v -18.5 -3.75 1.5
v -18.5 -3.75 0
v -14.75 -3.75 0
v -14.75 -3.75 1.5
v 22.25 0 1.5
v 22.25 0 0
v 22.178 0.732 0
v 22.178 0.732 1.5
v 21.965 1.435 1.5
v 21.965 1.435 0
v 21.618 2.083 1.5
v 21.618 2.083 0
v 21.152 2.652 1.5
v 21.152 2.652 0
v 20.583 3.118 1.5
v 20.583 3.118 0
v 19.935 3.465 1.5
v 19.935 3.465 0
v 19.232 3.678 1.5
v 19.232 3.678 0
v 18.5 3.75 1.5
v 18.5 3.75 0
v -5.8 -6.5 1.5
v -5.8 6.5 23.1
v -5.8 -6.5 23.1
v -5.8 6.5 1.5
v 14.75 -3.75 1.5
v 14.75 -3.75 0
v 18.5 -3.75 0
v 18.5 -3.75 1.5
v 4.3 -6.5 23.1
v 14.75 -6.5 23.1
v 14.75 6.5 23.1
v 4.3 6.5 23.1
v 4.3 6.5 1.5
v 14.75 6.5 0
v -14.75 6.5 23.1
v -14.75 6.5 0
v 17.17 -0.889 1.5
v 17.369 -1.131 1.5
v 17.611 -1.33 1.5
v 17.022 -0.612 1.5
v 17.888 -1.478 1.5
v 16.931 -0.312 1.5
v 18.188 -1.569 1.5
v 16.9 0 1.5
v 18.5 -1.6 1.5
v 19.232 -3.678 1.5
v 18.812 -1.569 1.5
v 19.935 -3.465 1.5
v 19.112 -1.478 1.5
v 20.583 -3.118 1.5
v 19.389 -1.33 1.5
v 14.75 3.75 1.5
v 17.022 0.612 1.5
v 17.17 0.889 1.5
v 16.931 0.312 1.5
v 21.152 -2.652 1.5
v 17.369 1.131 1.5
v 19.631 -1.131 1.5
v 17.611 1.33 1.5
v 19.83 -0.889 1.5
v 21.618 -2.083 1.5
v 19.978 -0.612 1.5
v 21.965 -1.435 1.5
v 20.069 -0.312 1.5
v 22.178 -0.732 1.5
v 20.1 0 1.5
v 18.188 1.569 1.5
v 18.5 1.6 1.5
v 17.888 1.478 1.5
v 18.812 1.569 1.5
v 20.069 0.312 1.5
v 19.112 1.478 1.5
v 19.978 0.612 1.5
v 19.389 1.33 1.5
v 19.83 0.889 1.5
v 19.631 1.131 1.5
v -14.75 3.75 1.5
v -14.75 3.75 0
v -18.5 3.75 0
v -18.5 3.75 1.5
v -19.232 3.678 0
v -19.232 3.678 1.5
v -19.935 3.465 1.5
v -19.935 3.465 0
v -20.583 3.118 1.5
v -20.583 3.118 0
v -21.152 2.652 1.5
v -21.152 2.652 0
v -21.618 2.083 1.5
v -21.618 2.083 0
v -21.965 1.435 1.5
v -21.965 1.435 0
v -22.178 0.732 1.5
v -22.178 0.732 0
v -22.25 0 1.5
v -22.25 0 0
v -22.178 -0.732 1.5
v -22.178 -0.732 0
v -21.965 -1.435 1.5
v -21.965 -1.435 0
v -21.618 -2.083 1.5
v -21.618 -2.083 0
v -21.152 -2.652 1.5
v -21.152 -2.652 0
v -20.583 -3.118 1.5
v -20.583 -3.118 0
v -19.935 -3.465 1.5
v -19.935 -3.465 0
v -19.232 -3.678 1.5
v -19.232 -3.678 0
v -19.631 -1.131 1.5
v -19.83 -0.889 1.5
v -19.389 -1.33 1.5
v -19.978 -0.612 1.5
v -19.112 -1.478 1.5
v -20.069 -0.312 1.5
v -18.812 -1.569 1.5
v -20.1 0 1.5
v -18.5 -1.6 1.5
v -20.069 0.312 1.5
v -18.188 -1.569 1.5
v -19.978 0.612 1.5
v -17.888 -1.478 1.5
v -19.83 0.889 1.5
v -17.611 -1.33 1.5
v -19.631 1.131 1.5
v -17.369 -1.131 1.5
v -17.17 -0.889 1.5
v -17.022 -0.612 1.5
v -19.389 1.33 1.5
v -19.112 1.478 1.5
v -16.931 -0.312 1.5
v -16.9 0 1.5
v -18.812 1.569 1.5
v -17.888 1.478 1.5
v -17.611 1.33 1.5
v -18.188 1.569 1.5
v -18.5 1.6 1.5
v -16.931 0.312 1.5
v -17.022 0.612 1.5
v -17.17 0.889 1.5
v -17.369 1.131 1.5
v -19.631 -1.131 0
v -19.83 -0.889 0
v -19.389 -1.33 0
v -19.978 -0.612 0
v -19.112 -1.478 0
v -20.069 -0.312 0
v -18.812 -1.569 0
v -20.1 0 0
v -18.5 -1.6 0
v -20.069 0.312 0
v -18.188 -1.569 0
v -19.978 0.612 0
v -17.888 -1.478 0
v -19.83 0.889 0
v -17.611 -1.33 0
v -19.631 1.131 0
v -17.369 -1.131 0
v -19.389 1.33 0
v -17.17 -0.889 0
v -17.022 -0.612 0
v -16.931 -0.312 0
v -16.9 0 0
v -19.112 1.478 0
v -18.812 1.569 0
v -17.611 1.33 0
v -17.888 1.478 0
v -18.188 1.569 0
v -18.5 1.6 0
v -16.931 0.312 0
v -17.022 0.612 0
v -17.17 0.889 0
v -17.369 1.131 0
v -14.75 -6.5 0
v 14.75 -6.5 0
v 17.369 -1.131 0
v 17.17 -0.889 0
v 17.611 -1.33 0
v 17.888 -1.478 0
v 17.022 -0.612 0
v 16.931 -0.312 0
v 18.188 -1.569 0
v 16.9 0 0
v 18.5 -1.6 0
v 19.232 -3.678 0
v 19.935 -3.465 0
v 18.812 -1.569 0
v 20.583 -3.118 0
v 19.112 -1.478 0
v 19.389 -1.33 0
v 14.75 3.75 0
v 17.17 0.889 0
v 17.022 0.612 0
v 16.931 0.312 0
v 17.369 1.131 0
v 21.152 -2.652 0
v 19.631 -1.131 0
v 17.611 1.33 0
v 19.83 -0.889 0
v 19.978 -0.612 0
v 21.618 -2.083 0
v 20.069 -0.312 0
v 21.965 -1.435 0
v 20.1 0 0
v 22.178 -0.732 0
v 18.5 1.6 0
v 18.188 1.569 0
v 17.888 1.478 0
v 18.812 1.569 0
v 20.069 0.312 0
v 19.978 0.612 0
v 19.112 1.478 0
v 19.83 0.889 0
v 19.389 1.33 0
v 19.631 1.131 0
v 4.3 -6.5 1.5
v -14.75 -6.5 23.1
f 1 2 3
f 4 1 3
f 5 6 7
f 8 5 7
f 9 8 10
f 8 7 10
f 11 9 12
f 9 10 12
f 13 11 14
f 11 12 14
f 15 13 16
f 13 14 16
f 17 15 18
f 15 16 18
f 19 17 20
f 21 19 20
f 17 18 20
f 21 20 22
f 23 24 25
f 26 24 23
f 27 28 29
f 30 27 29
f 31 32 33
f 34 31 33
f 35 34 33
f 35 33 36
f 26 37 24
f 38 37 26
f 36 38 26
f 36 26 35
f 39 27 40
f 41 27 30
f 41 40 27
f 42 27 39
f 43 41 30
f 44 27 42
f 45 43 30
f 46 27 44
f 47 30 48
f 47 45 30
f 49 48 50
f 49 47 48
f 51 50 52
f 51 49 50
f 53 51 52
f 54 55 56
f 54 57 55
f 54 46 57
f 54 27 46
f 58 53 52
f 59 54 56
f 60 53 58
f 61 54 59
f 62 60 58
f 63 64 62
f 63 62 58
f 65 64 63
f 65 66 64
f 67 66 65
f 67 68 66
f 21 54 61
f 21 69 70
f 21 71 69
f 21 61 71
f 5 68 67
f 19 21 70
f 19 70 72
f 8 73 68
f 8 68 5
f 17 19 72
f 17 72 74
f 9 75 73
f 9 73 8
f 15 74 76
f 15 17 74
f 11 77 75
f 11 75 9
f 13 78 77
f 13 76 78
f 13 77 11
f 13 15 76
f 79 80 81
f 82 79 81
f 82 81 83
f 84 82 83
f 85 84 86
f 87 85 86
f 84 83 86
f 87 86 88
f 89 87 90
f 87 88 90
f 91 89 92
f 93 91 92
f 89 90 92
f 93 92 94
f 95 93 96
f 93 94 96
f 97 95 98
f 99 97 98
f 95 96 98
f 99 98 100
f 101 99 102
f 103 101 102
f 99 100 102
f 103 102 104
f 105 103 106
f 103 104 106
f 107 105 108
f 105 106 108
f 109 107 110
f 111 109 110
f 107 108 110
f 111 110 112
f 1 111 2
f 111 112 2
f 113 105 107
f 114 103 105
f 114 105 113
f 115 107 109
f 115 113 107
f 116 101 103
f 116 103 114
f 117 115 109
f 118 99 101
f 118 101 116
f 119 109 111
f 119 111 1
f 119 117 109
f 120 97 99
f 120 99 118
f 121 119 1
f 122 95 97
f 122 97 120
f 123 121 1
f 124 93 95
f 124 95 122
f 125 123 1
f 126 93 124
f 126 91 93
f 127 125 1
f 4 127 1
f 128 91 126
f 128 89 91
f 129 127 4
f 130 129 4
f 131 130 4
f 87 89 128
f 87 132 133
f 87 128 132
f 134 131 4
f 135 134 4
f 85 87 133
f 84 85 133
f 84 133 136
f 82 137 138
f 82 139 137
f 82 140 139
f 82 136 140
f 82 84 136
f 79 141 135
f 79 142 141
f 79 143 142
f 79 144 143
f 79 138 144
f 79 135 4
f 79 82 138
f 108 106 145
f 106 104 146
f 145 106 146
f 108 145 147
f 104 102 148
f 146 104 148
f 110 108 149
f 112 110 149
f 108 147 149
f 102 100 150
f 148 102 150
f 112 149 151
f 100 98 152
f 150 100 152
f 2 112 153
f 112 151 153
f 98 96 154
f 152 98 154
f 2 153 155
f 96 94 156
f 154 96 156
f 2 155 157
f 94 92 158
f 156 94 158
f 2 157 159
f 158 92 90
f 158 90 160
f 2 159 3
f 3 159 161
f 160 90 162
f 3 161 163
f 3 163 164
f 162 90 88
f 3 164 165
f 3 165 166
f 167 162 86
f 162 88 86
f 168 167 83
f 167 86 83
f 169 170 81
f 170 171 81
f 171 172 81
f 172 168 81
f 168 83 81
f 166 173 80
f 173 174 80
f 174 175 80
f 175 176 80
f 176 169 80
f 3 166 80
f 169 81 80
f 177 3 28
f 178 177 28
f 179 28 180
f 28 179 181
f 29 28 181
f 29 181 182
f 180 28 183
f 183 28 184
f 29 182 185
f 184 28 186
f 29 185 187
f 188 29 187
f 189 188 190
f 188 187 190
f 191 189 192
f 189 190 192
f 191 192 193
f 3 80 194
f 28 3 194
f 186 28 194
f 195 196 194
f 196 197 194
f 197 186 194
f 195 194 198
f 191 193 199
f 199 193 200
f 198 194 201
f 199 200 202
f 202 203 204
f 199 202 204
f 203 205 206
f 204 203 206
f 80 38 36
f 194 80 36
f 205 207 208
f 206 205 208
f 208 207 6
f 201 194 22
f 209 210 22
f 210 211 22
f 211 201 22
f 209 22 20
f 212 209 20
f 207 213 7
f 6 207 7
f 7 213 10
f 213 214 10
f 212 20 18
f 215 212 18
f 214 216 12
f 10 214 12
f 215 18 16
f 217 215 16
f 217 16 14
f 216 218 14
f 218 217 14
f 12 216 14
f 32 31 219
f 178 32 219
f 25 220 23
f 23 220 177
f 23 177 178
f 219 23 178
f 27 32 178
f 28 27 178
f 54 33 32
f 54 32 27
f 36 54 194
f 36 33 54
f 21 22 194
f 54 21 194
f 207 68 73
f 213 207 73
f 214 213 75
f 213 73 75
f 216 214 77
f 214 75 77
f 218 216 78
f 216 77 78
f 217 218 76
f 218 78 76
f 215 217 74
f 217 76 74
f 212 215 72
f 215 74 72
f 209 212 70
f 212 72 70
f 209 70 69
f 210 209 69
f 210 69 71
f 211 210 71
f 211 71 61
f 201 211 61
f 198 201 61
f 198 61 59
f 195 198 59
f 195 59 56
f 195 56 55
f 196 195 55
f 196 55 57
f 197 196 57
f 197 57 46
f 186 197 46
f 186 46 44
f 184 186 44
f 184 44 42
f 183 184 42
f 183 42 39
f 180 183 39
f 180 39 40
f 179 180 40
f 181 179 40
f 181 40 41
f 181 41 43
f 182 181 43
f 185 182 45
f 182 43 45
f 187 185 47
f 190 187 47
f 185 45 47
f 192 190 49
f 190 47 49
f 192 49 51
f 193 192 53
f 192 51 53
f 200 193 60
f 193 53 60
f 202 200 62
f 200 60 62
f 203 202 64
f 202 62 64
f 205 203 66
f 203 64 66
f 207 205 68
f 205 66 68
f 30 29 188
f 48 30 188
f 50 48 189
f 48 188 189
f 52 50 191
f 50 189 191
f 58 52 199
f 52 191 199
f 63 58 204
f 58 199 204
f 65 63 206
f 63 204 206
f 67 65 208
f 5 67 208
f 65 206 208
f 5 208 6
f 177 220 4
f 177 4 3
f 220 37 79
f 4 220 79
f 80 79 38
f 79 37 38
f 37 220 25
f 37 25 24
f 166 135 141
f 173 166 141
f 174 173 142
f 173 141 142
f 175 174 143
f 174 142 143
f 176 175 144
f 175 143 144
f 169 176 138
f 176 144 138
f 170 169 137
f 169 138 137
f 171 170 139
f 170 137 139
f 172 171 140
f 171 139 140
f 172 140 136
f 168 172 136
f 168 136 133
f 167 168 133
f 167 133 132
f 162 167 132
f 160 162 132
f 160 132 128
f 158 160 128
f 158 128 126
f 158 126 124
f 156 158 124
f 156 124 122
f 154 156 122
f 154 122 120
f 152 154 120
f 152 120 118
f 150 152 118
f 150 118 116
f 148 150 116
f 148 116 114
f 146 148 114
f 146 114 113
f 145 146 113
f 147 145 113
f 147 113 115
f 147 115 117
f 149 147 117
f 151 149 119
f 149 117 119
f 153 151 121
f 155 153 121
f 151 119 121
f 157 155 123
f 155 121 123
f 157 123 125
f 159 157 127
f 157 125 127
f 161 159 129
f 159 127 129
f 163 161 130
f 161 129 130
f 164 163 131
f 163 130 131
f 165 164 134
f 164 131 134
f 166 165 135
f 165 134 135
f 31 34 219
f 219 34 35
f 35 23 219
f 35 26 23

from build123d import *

# Parameters (mm, degrees)
BACK_PLATE_DEPTH               = 1.5
DETECTOR_START                 = 14.75
SKETCH2_W                      = 21.6
SKETCH2_H                      = 13
DETECTOR_SIDE_DEPTH            = 10.45
EMITTER_START                  = -14.75
SKETCH2_2_W                    = 21.6
SKETCH2_2_H                    = 13
EMITTER_SIDE_DEPTH             = 8.95
F_3_2_3_2_DIAMETER_HOLE1_D     = 3.2
F_3_2_3_2_DIAMETER_HOLE1_DEPTH = 4
F_3_2_3_2_DIAMETER_HOLE1_TIP   = 0.96137699


with BuildPart() as part:
    # Sketch1 → Back Plate (new body)
    with BuildSketch(Plane.XY):
        with BuildLine():
            ThreePointArc((-18.5, -3.75), (-15.848349571, -2.651650429), (-14.75, 0))
            ThreePointArc((-14.75, 0), (-15.848349571, 2.651650429), (-18.5, 3.75))
            Line((-18.5, 3.75), (-18.5, -3.75))
        make_face()
        with BuildLine():
            ThreePointArc((-18.5, 3.75), (-22.25, 0), (-18.5, -3.75))
            Line((-18.5, -3.75), (-18.5, 3.75))
        make_face()
        with BuildLine():
            ThreePointArc((-18.5, 3.75), (-15.848349571, 2.651650429), (-14.75, 0))
            Line((-14.75, 0), (-14.75, 3.75))
            Line((-14.75, 3.75), (-18.5, 3.75))
        make_face()
        with BuildLine():
            Line((-18.5, -3.75), (-14.75, -3.75))
            Line((-14.75, -3.75), (-14.75, 0))
            ThreePointArc((-14.75, 0), (-15.848349571, -2.651650429), (-18.5, -3.75))
        make_face()
        Polygon((-14.75, -3.75), (-14.75, -6.5), (14.75, -6.5), (14.75, -3.75), (14.75, 4e-09), (14.75, 3.75), (14.75, 6.5), (-14.75, 6.5), (-14.75, 3.75), (-14.75, 0), align=None)
        with BuildLine():
            Line((14.75, 4e-09), (14.75, -3.75))
            Line((14.75, -3.75), (18.5, -3.75))
            ThreePointArc((18.5, -3.75), (15.848349569, -2.651650428), (14.75, 4e-09))
        make_face()
        with BuildLine():
            Line((14.75, 3.75), (14.75, 4e-09))
            ThreePointArc((14.75, 4e-09), (15.848349572, 2.651650431), (18.5, 3.75))
            Line((18.5, 3.75), (14.75, 3.75))
        make_face()
        with BuildLine():
            ThreePointArc((18.5, 3.75), (15.848349572, 2.651650431), (14.75, 4e-09))
            ThreePointArc((14.75, 4e-09), (15.848349569, -2.651650428), (18.5, -3.75))
            Line((18.5, -3.75), (18.5, 3.75))
        make_face()
        with BuildLine():
            Line((18.5, 3.75), (18.5, -3.75))
            ThreePointArc((18.5, -3.75), (21.151650429, -2.651650429), (22.25, 0))
            ThreePointArc((22.25, 0), (21.151650429, 2.651650429), (18.5, 3.75))
        make_face()
    extrude(amount=BACK_PLATE_DEPTH)

    # Sketch2 → Detector Side (add)
    with BuildSketch(Plane(origin=(0, 0, 0), x_dir=(0, 0, -1), z_dir=(1, 0, 0)).offset(DETECTOR_START)):
        with Locations((-12.3, 0)):
            Rectangle(SKETCH2_W, SKETCH2_H)
    extrude(amount=-DETECTOR_SIDE_DEPTH)

    # Sketch2<2> → Emitter Side (add)
    with BuildSketch(Plane(origin=(0, 0, 0), x_dir=(0, 0, -1), z_dir=(1, 0, 0)).offset(EMITTER_START)):
        with Locations((-12.3, 0)):
            Rectangle(SKETCH2_2_W, SKETCH2_2_H)
    extrude(amount=EMITTER_SIDE_DEPTH)

    # Ø3.2 (3.2) Diameter Hole1
    with Locations(Plane(origin=(0, 0, 0), x_dir=(-1, 0, 0), z_dir=(0, 0, -1))):
        with Locations((-18.5, 0), (18.5, 0)):
            Hole(F_3_2_3_2_DIAMETER_HOLE1_D / 2, depth=F_3_2_3_2_DIAMETER_HOLE1_DEPTH)
            with Locations((0, 0, -(F_3_2_3_2_DIAMETER_HOLE1_DEPTH + F_3_2_3_2_DIAMETER_HOLE1_TIP / 2))):  # 118° drill point
                Cone(0, F_3_2_3_2_DIAMETER_HOLE1_D / 2, F_3_2_3_2_DIAMETER_HOLE1_TIP, mode=Mode.SUBTRACT)


solid = part.part
